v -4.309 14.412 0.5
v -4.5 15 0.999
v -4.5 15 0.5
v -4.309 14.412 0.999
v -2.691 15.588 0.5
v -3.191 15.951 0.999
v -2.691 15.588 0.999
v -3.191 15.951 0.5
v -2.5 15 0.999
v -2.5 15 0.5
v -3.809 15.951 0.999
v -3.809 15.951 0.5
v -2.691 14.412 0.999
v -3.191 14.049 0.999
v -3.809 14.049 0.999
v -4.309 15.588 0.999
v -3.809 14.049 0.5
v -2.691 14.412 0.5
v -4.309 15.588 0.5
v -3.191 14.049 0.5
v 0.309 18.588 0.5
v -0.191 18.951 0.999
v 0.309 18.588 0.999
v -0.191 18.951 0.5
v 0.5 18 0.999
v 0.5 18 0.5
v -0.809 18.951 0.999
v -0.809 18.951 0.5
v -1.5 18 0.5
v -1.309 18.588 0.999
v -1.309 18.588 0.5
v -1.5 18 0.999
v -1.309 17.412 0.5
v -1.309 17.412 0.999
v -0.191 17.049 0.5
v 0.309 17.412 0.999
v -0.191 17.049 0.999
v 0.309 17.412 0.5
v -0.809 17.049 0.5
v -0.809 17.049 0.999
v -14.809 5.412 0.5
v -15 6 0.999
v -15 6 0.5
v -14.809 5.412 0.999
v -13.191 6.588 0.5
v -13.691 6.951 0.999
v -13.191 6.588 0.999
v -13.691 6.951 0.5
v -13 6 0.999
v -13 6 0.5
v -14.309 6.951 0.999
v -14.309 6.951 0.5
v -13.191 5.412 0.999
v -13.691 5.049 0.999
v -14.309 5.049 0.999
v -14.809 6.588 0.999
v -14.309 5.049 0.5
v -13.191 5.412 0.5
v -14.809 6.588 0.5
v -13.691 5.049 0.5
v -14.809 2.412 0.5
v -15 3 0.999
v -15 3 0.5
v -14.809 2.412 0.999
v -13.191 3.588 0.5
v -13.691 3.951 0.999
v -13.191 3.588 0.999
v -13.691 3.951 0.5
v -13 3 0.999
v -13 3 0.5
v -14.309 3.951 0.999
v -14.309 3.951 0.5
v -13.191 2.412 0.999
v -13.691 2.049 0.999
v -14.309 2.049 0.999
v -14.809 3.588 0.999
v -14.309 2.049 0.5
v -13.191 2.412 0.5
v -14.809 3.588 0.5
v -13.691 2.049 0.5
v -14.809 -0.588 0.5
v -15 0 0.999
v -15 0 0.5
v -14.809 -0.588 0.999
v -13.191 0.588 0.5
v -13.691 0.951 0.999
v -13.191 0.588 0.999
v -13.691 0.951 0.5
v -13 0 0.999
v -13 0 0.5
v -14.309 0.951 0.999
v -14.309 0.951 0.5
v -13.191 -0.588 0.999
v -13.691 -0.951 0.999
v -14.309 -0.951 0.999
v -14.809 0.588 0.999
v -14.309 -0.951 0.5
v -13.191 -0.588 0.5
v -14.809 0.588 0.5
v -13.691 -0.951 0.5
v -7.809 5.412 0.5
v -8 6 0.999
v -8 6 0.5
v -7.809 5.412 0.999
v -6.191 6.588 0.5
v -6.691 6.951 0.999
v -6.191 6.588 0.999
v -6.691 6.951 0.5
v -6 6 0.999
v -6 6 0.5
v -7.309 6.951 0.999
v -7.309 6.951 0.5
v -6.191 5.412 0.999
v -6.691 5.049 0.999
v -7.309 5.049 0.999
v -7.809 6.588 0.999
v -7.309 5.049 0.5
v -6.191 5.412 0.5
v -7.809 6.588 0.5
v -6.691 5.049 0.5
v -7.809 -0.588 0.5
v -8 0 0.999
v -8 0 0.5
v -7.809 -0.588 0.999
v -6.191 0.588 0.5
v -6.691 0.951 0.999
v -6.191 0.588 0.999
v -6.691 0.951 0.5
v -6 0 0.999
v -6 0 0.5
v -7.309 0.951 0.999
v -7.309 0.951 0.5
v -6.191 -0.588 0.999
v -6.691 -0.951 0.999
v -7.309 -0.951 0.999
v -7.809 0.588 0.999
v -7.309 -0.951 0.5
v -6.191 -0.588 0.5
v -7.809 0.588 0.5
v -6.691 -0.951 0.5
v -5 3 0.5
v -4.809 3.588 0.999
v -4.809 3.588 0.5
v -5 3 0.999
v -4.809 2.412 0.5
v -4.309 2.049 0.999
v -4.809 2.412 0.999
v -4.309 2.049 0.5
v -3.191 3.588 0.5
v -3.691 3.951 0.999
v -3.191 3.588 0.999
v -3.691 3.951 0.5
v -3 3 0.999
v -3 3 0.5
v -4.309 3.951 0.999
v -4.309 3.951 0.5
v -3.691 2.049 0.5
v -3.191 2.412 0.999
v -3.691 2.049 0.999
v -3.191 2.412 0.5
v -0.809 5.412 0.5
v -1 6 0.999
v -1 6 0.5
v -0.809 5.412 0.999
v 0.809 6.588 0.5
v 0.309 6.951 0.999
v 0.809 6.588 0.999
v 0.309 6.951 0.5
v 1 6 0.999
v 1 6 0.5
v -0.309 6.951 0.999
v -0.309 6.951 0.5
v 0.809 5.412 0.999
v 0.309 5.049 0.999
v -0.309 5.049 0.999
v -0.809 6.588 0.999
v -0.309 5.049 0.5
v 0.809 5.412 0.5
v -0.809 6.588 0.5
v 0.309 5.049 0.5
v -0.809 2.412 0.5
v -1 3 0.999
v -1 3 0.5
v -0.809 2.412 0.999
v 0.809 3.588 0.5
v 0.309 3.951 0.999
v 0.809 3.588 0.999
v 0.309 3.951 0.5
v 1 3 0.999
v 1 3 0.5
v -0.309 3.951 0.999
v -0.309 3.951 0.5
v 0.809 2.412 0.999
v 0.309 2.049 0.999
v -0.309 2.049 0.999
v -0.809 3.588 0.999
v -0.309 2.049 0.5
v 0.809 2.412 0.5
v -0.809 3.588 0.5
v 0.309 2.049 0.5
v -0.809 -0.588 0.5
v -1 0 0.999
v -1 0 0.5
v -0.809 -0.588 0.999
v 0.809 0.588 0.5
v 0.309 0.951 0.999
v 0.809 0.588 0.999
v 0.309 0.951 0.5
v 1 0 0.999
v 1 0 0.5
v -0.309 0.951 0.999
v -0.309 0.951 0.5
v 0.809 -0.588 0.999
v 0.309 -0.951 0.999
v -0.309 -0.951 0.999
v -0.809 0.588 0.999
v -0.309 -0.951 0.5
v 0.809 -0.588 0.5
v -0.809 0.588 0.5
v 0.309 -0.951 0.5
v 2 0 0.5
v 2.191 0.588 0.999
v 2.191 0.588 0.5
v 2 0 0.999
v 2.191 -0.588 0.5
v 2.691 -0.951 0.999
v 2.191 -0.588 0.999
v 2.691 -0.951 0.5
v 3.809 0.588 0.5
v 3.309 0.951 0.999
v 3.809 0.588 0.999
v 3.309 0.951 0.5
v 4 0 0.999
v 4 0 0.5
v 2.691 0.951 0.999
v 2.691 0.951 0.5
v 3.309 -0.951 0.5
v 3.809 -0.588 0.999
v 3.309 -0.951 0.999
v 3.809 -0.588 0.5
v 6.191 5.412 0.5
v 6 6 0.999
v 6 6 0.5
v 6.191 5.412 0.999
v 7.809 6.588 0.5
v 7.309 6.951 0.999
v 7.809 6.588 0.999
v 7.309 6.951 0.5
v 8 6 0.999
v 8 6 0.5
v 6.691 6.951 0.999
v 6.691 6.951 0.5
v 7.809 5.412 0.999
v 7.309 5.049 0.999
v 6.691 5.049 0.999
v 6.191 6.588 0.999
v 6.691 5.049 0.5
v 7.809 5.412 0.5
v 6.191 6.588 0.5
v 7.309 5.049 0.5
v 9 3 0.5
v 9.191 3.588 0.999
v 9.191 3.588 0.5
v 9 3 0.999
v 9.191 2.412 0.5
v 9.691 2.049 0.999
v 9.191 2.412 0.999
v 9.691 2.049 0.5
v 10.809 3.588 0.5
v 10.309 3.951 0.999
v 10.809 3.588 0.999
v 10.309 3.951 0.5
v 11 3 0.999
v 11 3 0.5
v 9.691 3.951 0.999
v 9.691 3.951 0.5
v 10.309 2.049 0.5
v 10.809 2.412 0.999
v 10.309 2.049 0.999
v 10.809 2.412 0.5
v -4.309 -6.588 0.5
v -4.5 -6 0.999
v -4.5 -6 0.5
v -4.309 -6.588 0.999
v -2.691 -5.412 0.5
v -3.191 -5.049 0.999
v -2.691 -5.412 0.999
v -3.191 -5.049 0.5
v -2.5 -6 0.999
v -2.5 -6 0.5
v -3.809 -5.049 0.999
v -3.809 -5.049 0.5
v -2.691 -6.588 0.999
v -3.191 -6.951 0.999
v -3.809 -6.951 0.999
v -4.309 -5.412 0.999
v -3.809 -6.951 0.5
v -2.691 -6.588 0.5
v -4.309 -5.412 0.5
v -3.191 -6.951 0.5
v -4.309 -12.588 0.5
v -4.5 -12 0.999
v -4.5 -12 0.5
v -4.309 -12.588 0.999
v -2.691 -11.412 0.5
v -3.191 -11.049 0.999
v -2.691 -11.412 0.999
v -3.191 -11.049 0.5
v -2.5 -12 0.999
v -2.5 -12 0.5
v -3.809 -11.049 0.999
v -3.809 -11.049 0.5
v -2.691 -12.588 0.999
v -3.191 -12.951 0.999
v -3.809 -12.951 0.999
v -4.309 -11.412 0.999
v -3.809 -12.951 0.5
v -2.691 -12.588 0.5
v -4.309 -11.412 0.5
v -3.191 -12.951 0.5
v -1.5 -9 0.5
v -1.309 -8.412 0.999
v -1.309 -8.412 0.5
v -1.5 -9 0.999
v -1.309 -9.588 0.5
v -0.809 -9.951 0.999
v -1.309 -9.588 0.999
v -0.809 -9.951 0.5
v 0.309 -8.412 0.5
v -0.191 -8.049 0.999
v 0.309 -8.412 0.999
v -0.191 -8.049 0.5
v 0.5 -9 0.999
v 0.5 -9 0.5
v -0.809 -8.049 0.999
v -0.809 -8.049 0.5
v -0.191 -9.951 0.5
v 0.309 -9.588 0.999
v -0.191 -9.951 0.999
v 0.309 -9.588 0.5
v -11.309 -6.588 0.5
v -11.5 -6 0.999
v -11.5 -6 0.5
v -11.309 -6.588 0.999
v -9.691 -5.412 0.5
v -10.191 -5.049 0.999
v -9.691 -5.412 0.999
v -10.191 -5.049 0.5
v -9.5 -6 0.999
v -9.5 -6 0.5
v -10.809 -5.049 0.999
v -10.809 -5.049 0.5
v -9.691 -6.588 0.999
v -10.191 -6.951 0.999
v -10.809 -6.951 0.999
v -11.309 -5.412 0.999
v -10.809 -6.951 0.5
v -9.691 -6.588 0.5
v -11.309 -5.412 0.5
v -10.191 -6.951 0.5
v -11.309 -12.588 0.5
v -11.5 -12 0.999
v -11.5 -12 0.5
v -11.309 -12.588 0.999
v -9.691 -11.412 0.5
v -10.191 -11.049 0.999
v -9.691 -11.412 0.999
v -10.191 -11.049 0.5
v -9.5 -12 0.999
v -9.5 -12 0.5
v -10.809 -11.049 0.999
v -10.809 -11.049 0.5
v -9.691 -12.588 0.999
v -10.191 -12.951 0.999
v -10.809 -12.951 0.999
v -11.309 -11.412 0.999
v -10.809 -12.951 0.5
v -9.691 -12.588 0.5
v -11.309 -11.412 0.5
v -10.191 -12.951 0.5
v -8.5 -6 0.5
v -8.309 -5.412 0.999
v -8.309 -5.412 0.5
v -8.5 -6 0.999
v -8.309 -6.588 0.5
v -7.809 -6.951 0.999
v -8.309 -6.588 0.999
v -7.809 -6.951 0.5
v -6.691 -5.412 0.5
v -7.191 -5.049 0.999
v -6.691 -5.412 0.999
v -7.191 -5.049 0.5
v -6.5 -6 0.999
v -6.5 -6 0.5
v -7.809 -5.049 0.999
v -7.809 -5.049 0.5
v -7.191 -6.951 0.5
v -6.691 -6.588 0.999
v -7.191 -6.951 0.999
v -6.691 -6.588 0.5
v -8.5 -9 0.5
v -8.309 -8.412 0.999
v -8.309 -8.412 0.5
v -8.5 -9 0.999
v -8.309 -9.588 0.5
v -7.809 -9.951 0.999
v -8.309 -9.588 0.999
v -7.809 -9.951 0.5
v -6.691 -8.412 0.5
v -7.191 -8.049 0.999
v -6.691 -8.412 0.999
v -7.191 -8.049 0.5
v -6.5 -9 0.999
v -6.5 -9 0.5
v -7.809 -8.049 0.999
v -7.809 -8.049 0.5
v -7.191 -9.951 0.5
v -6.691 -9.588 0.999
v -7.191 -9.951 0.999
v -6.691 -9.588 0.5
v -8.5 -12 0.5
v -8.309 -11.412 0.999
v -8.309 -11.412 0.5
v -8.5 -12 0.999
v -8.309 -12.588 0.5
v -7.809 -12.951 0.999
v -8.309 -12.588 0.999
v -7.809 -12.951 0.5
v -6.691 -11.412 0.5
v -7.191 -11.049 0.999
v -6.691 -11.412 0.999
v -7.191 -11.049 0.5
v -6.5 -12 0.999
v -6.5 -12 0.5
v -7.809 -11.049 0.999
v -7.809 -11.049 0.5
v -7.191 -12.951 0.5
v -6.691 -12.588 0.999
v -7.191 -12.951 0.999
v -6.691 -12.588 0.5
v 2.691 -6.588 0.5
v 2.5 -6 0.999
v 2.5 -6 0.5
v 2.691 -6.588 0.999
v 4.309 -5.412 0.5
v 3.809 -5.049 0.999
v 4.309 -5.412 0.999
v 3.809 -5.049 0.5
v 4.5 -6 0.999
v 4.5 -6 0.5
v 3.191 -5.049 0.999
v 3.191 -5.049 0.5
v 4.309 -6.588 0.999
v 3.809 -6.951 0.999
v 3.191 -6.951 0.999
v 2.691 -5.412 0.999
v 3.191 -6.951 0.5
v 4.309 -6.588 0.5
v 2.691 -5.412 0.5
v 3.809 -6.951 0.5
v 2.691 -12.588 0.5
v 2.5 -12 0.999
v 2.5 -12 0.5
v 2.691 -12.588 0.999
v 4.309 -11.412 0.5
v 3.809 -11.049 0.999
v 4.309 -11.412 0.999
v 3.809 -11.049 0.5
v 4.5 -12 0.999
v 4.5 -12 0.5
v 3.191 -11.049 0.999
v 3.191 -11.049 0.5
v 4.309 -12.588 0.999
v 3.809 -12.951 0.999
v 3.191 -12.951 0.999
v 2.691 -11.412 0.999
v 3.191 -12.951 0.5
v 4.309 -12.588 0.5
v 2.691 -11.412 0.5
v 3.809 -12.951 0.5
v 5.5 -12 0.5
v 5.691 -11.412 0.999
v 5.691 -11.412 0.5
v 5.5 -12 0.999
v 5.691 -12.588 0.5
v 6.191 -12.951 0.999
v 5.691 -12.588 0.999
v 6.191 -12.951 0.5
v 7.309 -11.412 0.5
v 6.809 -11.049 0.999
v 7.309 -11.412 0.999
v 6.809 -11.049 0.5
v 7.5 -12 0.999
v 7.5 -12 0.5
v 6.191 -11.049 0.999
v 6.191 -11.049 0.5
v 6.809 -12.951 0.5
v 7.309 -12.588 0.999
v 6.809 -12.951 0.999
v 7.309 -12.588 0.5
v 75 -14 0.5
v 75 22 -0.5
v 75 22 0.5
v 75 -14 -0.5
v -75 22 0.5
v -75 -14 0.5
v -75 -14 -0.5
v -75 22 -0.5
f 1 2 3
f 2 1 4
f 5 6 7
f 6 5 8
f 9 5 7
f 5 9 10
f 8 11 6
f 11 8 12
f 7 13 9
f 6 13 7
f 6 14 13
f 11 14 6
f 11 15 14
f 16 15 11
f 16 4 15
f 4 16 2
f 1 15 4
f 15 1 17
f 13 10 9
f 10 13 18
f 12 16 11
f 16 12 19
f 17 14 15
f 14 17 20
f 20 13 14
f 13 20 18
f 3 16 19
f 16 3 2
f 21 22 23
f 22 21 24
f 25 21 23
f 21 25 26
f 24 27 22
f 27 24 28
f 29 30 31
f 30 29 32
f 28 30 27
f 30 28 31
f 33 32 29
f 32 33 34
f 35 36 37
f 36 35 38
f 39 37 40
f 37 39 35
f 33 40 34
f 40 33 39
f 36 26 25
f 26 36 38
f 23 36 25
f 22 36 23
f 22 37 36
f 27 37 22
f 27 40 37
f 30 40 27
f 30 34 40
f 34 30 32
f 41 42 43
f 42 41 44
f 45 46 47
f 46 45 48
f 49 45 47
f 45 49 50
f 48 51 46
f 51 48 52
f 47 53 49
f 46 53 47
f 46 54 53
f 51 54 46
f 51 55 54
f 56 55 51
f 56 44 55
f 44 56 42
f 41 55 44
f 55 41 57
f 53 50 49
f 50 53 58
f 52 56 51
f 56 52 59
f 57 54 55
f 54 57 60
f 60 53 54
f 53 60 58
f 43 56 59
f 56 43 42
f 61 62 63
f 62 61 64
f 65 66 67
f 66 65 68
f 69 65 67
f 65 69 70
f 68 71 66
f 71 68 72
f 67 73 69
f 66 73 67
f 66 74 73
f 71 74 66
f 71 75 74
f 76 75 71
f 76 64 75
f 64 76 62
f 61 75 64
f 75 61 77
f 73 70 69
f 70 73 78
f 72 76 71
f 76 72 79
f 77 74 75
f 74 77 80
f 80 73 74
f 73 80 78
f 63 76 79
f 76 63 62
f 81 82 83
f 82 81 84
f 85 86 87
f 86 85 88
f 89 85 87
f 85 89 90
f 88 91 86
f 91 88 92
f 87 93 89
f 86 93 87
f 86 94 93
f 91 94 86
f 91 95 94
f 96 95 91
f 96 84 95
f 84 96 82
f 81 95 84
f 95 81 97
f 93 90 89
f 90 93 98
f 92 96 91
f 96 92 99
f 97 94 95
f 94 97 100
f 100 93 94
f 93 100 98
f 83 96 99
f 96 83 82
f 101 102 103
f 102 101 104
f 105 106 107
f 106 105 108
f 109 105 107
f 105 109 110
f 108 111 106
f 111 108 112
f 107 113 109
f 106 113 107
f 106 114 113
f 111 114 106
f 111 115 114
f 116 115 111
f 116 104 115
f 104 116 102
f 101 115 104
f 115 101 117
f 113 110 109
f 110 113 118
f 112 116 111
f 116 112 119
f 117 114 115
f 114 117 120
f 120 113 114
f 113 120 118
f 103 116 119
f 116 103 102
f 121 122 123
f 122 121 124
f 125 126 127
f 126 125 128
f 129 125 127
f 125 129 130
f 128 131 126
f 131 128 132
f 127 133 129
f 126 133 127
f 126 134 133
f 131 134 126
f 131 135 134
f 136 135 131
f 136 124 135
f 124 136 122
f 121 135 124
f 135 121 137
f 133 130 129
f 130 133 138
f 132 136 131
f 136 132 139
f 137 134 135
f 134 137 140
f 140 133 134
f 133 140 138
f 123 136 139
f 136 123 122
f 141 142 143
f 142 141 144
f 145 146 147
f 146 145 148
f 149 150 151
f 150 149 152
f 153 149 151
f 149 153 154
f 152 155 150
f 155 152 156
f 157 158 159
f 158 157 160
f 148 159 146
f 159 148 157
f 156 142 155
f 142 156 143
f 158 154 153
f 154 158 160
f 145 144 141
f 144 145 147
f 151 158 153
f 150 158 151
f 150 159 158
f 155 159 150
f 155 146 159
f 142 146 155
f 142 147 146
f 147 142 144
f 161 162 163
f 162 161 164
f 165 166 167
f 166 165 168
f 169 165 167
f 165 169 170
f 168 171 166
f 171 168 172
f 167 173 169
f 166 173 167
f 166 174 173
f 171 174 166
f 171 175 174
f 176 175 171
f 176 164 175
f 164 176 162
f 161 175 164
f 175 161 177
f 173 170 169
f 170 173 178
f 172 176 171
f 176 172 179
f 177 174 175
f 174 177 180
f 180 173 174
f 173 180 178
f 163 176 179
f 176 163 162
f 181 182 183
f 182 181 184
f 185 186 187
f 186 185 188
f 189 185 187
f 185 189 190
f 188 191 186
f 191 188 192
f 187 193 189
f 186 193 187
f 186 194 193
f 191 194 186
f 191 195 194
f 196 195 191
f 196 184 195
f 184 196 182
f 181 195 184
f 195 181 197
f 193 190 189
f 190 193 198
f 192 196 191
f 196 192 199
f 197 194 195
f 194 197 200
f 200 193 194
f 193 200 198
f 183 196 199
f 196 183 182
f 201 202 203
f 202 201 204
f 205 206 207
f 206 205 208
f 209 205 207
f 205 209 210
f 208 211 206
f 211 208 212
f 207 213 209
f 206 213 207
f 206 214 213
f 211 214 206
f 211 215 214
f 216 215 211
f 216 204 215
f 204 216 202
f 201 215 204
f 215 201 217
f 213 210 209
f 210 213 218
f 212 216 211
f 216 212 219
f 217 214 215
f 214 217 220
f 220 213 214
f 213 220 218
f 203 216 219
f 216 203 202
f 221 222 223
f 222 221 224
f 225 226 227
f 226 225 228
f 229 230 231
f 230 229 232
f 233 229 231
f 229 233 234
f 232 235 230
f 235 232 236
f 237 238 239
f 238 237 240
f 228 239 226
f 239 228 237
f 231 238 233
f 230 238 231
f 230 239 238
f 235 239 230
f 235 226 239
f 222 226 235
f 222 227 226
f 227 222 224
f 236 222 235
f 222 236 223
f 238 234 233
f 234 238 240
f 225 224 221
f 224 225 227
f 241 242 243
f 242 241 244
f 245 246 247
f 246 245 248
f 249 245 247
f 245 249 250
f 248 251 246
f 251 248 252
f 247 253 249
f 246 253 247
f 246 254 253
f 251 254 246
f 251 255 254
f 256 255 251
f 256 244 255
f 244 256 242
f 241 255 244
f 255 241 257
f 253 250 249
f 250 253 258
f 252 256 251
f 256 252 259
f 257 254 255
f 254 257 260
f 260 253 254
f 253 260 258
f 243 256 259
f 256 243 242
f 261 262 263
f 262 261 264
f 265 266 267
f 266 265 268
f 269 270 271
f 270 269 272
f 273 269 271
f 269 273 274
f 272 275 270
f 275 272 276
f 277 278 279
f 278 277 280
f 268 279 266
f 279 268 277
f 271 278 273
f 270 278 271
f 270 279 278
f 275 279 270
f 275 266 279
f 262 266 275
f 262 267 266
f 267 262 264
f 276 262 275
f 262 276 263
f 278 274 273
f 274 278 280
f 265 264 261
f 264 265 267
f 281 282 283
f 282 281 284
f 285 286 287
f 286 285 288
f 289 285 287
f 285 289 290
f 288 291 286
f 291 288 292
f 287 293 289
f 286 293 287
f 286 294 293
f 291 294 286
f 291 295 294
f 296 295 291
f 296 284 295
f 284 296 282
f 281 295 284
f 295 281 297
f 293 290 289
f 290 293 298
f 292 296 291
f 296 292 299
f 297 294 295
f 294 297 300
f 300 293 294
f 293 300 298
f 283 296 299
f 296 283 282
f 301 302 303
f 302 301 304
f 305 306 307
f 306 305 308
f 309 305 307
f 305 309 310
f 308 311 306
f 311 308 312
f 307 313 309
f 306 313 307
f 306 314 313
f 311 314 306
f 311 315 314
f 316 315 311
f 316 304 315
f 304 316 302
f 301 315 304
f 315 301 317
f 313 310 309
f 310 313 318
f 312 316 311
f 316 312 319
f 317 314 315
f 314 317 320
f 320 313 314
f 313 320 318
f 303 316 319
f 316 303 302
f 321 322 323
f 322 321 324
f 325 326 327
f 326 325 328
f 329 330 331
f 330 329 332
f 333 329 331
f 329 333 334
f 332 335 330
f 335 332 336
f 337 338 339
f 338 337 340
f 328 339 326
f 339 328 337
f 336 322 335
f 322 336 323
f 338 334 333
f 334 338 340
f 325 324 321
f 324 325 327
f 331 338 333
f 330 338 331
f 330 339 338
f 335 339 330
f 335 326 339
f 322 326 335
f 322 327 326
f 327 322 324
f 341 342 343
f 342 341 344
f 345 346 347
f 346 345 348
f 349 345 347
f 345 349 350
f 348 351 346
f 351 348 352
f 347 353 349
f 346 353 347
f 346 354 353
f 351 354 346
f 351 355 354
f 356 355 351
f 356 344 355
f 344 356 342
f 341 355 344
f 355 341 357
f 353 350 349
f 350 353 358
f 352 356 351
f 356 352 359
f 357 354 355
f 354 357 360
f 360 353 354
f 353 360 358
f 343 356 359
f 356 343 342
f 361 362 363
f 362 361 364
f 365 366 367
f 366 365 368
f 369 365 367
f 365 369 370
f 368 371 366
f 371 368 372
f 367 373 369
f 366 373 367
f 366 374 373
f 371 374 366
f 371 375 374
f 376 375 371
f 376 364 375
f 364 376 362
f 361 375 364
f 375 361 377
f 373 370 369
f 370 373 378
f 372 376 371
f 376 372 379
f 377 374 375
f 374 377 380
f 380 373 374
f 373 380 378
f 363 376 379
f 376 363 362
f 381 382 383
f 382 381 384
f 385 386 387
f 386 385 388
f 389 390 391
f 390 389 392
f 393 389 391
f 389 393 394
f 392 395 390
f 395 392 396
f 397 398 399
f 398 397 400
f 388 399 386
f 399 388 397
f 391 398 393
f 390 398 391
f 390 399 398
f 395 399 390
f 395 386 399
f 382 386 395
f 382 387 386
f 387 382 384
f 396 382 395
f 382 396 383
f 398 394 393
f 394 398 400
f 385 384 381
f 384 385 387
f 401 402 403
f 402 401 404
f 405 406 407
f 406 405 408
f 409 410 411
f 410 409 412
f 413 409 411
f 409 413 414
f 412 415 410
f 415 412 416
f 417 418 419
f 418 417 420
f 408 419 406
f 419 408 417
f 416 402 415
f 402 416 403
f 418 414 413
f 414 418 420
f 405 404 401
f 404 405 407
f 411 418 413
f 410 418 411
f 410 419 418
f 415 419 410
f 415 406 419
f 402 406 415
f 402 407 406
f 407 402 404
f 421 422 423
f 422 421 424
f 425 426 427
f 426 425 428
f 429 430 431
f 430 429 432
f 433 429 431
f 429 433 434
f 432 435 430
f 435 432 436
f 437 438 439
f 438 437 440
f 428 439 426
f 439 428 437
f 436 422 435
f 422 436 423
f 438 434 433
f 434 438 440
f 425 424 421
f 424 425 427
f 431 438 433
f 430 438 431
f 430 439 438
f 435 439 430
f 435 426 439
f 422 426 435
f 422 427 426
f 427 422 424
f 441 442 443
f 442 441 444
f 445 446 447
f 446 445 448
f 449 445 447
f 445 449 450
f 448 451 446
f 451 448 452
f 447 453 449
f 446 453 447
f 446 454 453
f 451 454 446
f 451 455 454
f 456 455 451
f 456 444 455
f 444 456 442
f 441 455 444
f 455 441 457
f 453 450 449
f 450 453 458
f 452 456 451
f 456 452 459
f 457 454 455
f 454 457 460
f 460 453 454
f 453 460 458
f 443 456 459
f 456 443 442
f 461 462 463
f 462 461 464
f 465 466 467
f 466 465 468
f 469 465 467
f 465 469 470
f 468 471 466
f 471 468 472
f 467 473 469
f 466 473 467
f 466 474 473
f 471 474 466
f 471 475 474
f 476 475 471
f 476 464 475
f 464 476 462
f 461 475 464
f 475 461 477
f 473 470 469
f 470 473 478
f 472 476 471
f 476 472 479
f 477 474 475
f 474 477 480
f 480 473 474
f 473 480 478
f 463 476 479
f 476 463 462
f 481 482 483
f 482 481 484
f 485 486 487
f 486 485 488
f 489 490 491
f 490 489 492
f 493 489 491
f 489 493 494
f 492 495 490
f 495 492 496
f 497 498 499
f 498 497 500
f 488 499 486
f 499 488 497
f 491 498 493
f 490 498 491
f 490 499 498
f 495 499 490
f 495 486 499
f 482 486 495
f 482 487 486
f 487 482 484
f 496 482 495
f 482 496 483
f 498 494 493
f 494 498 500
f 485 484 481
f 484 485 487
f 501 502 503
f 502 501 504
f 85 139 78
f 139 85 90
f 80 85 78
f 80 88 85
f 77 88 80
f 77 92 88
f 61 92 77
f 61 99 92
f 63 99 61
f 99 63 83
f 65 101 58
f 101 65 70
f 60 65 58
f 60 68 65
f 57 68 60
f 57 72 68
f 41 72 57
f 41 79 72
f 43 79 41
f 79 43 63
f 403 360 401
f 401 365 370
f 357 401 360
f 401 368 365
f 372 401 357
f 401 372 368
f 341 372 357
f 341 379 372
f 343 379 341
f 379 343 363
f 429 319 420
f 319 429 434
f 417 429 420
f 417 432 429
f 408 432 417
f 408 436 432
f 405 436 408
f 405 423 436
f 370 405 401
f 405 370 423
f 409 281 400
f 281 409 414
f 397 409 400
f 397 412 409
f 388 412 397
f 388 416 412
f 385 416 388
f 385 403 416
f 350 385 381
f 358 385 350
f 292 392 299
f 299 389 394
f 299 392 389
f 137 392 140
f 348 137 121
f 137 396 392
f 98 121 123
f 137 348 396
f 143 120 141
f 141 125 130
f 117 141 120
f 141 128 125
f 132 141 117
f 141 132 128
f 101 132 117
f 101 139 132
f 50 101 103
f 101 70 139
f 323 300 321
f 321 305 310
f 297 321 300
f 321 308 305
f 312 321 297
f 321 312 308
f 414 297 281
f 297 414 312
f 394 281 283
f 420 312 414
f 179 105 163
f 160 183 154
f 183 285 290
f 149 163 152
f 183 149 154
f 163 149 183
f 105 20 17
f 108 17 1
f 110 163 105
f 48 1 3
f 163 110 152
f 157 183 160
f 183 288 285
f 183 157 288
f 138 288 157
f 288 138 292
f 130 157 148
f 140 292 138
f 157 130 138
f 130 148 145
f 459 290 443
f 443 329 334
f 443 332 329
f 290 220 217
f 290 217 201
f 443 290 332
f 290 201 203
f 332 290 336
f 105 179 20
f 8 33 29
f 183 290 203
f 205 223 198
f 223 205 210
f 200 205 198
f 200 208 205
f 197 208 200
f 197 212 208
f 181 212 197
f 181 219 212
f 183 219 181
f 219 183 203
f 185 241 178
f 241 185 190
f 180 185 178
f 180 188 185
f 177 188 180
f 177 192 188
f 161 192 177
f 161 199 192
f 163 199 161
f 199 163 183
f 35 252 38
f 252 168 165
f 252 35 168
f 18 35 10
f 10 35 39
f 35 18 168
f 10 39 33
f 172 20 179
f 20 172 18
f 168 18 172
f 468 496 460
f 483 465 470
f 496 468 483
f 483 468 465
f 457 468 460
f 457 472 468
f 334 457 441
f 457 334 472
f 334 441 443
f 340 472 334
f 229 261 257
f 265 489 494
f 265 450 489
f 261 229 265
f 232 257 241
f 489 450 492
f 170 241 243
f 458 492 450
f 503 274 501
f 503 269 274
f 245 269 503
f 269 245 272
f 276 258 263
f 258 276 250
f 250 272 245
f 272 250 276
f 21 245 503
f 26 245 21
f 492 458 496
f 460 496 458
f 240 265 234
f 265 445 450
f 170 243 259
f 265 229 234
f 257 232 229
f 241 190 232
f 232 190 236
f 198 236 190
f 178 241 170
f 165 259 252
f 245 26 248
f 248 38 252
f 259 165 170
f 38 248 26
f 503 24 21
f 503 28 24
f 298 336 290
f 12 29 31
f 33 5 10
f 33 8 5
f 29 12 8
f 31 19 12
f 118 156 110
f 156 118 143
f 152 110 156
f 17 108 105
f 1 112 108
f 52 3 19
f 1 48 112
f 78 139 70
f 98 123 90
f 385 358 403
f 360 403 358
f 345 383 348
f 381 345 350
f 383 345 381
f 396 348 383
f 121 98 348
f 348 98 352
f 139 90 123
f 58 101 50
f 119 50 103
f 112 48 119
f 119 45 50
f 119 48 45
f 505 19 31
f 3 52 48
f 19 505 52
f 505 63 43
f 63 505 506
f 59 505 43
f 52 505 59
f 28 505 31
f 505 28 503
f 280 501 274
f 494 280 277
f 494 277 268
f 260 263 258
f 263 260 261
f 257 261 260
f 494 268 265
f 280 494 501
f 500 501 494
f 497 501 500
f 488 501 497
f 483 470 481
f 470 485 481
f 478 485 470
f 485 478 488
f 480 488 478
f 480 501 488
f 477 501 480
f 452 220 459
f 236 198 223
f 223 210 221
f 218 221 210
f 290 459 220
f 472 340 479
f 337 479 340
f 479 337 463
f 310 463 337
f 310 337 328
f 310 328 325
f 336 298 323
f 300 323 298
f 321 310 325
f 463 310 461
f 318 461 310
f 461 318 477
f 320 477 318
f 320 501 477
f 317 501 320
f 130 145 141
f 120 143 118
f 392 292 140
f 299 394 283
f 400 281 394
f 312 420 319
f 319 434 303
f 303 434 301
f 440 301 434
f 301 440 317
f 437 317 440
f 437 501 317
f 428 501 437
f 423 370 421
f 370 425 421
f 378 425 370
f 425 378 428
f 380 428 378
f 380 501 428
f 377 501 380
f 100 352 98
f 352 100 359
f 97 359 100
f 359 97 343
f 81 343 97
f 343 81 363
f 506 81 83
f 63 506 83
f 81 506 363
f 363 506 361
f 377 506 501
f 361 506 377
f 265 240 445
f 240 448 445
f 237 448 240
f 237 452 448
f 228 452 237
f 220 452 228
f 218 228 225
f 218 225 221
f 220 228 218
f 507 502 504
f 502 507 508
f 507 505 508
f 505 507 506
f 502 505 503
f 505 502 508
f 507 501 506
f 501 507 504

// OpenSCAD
/*
 * PostCard in Braille
 * convert :  scad -> stl -> gcode
 *
 * derived from https://www.thingiverse.com/thing:8000
 */

/* 
   1. Create a new .scad script with a "use" statement at the top of your .scad file and then use the drawText function to print just the braille. 
      There are four parameters:
		text       - string that you want printed in braille (required)
		dotHeight  - float z height of each dot. Make sure this value is at least as large as your layer height. (optional, defaults to 0.5)
		dotRadius  - float radius of each dot (optional, defaults to 1)
		charWidth  - float width of each braille character (optional, defaults to 7)
		resolution - the resolution of the dots (optional, defaults to 10)
				You will have to manually position and draw each line with this method
	
	2. Open the .scad script and specify the text you want to print in the testText variable. 
	   You will also need to specify the width of the slab that it's drawn on. 
	   It takes quite a bit of computational power to render this stuff, it almost brought my laptop to a standstill.
 */

// Lines 7, # of Character 12
message = [ "I", "Love", "You"];

dotHeight = 0.5;
dotRadius = 1;
charWidth = 7;
resolution = 10;
lineHeight = 12;
totalHeight = len(message) * lineHeight;
slabX = 150;
slabY = totalHeight;

charKeys   = ["a", "A", "b", "B", "c", "C", "d", "D", "e", "E", "f", "F", "g", "G", "h", "H", "i", "I", "j", "J", "k", "K", "l", "L", "m", "M", "n", "N", 
              "o", "O", "p", "P", "q", "Q", "r", "R", "s", "S", "t", "T", "u", "U", "v", "V", "w", "W", "x", "X", "y", "Y", "z", "Z", 
			  ",", ";", ":", ".", "!", "(", ")", "?", "\"", "*", "'", "-"];
			  
charValues = [[1], [1], [1, 2], [1, 2], [1, 4], [1, 4], [1, 4, 5], [1, 4, 5], [1, 5], [1, 5], [1, 2, 4], [1, 2, 4], [1, 2, 4, 5], [1, 2, 4, 5], [1, 2, 5], 
              [1, 2, 5], [2, 4], [2, 4], [2, 4, 5], [2, 4, 5], [1, 3], [1, 3], [1, 2, 3], [1, 2, 3], [1, 3, 4], [1, 3, 4], [1, 3, 4, 5], [1, 3, 4, 5], [1, 3, 5],
		      [1, 3, 5], [1, 2, 3, 4], [1, 2, 3, 4], [1, 2, 3, 4, 5], [1, 2, 3, 4, 5], [1, 2, 3, 5], [1, 2, 3, 5], [2, 3, 4], [2, 3, 4], [2, 3, 4, 5], [2, 3, 4, 5], 
			  [1, 3, 6], [1, 3, 6], [1, 2, 3, 6], [1, 2, 3, 6], [2, 4, 5, 6], [2, 4, 5, 6], [1, 3, 4, 6], [1, 3, 4, 6], [1, 3, 4, 5, 6], [1, 3, 4, 5, 6], [1, 3, 5, 6], 
			  [1, 3, 5, 6], [2], [2, 3], [2, 5], [2, 5, 6], [2, 3, 5], [2, 3, 5, 6], [2, 3, 5, 6], [2, 3, 6], [2, 3, 6], [3, 5], [3], [3, 6]];

module drawDot(location, dotHeight = 0.5, dotRadius = 0.5, resolution = 10) {
	translate(location) {
		difference() {
			cylinder(h=dotHeight, r=dotRadius, $fn = resolution);
		}
	}
}

module drawCharacter(charMap, dotHeight = 0.5, dotRadius = 0.5, resolution = 10) {
	for(i = [0: len(charMap)-1]) {
		drawDot([floor((charMap[i]-1)/3)*dotHeight*3*dotRadius*2, -(charMap[i]-1)%3*dotHeight*3*dotRadius*2, 0], dotHeight, dotRadius, resolution);
	}
}

module drawText(text, dotHeight = 0.5, dotRadius = 0.5, charWidth = 3.5, resolution = 10) {
	for(i = [0: len(text)-1]) {
		translate([charWidth*i, 0, 0]) {
			for(j = [0:len(charKeys)]) {
				if(charKeys[j] == text[i]) {
					drawCharacter(charValues[j], dotHeight, dotRadius, resolution);
				}
			}
		}
	}
}

translate([0, lineHeight/3, 0]) {
	cube([slabX, slabY, 1], true);
}

translate([0, 0, 0.499]) {
	for(i = [0: len(message)]) {
		translate([-len(message[i])*charWidth/2, totalHeight/2-lineHeight*i, 0])
			drawText(message[i], dotHeight = dotHeight, dotRadius = dotRadius, charWidth = charWidth, resolution = resolution);
	}
}
